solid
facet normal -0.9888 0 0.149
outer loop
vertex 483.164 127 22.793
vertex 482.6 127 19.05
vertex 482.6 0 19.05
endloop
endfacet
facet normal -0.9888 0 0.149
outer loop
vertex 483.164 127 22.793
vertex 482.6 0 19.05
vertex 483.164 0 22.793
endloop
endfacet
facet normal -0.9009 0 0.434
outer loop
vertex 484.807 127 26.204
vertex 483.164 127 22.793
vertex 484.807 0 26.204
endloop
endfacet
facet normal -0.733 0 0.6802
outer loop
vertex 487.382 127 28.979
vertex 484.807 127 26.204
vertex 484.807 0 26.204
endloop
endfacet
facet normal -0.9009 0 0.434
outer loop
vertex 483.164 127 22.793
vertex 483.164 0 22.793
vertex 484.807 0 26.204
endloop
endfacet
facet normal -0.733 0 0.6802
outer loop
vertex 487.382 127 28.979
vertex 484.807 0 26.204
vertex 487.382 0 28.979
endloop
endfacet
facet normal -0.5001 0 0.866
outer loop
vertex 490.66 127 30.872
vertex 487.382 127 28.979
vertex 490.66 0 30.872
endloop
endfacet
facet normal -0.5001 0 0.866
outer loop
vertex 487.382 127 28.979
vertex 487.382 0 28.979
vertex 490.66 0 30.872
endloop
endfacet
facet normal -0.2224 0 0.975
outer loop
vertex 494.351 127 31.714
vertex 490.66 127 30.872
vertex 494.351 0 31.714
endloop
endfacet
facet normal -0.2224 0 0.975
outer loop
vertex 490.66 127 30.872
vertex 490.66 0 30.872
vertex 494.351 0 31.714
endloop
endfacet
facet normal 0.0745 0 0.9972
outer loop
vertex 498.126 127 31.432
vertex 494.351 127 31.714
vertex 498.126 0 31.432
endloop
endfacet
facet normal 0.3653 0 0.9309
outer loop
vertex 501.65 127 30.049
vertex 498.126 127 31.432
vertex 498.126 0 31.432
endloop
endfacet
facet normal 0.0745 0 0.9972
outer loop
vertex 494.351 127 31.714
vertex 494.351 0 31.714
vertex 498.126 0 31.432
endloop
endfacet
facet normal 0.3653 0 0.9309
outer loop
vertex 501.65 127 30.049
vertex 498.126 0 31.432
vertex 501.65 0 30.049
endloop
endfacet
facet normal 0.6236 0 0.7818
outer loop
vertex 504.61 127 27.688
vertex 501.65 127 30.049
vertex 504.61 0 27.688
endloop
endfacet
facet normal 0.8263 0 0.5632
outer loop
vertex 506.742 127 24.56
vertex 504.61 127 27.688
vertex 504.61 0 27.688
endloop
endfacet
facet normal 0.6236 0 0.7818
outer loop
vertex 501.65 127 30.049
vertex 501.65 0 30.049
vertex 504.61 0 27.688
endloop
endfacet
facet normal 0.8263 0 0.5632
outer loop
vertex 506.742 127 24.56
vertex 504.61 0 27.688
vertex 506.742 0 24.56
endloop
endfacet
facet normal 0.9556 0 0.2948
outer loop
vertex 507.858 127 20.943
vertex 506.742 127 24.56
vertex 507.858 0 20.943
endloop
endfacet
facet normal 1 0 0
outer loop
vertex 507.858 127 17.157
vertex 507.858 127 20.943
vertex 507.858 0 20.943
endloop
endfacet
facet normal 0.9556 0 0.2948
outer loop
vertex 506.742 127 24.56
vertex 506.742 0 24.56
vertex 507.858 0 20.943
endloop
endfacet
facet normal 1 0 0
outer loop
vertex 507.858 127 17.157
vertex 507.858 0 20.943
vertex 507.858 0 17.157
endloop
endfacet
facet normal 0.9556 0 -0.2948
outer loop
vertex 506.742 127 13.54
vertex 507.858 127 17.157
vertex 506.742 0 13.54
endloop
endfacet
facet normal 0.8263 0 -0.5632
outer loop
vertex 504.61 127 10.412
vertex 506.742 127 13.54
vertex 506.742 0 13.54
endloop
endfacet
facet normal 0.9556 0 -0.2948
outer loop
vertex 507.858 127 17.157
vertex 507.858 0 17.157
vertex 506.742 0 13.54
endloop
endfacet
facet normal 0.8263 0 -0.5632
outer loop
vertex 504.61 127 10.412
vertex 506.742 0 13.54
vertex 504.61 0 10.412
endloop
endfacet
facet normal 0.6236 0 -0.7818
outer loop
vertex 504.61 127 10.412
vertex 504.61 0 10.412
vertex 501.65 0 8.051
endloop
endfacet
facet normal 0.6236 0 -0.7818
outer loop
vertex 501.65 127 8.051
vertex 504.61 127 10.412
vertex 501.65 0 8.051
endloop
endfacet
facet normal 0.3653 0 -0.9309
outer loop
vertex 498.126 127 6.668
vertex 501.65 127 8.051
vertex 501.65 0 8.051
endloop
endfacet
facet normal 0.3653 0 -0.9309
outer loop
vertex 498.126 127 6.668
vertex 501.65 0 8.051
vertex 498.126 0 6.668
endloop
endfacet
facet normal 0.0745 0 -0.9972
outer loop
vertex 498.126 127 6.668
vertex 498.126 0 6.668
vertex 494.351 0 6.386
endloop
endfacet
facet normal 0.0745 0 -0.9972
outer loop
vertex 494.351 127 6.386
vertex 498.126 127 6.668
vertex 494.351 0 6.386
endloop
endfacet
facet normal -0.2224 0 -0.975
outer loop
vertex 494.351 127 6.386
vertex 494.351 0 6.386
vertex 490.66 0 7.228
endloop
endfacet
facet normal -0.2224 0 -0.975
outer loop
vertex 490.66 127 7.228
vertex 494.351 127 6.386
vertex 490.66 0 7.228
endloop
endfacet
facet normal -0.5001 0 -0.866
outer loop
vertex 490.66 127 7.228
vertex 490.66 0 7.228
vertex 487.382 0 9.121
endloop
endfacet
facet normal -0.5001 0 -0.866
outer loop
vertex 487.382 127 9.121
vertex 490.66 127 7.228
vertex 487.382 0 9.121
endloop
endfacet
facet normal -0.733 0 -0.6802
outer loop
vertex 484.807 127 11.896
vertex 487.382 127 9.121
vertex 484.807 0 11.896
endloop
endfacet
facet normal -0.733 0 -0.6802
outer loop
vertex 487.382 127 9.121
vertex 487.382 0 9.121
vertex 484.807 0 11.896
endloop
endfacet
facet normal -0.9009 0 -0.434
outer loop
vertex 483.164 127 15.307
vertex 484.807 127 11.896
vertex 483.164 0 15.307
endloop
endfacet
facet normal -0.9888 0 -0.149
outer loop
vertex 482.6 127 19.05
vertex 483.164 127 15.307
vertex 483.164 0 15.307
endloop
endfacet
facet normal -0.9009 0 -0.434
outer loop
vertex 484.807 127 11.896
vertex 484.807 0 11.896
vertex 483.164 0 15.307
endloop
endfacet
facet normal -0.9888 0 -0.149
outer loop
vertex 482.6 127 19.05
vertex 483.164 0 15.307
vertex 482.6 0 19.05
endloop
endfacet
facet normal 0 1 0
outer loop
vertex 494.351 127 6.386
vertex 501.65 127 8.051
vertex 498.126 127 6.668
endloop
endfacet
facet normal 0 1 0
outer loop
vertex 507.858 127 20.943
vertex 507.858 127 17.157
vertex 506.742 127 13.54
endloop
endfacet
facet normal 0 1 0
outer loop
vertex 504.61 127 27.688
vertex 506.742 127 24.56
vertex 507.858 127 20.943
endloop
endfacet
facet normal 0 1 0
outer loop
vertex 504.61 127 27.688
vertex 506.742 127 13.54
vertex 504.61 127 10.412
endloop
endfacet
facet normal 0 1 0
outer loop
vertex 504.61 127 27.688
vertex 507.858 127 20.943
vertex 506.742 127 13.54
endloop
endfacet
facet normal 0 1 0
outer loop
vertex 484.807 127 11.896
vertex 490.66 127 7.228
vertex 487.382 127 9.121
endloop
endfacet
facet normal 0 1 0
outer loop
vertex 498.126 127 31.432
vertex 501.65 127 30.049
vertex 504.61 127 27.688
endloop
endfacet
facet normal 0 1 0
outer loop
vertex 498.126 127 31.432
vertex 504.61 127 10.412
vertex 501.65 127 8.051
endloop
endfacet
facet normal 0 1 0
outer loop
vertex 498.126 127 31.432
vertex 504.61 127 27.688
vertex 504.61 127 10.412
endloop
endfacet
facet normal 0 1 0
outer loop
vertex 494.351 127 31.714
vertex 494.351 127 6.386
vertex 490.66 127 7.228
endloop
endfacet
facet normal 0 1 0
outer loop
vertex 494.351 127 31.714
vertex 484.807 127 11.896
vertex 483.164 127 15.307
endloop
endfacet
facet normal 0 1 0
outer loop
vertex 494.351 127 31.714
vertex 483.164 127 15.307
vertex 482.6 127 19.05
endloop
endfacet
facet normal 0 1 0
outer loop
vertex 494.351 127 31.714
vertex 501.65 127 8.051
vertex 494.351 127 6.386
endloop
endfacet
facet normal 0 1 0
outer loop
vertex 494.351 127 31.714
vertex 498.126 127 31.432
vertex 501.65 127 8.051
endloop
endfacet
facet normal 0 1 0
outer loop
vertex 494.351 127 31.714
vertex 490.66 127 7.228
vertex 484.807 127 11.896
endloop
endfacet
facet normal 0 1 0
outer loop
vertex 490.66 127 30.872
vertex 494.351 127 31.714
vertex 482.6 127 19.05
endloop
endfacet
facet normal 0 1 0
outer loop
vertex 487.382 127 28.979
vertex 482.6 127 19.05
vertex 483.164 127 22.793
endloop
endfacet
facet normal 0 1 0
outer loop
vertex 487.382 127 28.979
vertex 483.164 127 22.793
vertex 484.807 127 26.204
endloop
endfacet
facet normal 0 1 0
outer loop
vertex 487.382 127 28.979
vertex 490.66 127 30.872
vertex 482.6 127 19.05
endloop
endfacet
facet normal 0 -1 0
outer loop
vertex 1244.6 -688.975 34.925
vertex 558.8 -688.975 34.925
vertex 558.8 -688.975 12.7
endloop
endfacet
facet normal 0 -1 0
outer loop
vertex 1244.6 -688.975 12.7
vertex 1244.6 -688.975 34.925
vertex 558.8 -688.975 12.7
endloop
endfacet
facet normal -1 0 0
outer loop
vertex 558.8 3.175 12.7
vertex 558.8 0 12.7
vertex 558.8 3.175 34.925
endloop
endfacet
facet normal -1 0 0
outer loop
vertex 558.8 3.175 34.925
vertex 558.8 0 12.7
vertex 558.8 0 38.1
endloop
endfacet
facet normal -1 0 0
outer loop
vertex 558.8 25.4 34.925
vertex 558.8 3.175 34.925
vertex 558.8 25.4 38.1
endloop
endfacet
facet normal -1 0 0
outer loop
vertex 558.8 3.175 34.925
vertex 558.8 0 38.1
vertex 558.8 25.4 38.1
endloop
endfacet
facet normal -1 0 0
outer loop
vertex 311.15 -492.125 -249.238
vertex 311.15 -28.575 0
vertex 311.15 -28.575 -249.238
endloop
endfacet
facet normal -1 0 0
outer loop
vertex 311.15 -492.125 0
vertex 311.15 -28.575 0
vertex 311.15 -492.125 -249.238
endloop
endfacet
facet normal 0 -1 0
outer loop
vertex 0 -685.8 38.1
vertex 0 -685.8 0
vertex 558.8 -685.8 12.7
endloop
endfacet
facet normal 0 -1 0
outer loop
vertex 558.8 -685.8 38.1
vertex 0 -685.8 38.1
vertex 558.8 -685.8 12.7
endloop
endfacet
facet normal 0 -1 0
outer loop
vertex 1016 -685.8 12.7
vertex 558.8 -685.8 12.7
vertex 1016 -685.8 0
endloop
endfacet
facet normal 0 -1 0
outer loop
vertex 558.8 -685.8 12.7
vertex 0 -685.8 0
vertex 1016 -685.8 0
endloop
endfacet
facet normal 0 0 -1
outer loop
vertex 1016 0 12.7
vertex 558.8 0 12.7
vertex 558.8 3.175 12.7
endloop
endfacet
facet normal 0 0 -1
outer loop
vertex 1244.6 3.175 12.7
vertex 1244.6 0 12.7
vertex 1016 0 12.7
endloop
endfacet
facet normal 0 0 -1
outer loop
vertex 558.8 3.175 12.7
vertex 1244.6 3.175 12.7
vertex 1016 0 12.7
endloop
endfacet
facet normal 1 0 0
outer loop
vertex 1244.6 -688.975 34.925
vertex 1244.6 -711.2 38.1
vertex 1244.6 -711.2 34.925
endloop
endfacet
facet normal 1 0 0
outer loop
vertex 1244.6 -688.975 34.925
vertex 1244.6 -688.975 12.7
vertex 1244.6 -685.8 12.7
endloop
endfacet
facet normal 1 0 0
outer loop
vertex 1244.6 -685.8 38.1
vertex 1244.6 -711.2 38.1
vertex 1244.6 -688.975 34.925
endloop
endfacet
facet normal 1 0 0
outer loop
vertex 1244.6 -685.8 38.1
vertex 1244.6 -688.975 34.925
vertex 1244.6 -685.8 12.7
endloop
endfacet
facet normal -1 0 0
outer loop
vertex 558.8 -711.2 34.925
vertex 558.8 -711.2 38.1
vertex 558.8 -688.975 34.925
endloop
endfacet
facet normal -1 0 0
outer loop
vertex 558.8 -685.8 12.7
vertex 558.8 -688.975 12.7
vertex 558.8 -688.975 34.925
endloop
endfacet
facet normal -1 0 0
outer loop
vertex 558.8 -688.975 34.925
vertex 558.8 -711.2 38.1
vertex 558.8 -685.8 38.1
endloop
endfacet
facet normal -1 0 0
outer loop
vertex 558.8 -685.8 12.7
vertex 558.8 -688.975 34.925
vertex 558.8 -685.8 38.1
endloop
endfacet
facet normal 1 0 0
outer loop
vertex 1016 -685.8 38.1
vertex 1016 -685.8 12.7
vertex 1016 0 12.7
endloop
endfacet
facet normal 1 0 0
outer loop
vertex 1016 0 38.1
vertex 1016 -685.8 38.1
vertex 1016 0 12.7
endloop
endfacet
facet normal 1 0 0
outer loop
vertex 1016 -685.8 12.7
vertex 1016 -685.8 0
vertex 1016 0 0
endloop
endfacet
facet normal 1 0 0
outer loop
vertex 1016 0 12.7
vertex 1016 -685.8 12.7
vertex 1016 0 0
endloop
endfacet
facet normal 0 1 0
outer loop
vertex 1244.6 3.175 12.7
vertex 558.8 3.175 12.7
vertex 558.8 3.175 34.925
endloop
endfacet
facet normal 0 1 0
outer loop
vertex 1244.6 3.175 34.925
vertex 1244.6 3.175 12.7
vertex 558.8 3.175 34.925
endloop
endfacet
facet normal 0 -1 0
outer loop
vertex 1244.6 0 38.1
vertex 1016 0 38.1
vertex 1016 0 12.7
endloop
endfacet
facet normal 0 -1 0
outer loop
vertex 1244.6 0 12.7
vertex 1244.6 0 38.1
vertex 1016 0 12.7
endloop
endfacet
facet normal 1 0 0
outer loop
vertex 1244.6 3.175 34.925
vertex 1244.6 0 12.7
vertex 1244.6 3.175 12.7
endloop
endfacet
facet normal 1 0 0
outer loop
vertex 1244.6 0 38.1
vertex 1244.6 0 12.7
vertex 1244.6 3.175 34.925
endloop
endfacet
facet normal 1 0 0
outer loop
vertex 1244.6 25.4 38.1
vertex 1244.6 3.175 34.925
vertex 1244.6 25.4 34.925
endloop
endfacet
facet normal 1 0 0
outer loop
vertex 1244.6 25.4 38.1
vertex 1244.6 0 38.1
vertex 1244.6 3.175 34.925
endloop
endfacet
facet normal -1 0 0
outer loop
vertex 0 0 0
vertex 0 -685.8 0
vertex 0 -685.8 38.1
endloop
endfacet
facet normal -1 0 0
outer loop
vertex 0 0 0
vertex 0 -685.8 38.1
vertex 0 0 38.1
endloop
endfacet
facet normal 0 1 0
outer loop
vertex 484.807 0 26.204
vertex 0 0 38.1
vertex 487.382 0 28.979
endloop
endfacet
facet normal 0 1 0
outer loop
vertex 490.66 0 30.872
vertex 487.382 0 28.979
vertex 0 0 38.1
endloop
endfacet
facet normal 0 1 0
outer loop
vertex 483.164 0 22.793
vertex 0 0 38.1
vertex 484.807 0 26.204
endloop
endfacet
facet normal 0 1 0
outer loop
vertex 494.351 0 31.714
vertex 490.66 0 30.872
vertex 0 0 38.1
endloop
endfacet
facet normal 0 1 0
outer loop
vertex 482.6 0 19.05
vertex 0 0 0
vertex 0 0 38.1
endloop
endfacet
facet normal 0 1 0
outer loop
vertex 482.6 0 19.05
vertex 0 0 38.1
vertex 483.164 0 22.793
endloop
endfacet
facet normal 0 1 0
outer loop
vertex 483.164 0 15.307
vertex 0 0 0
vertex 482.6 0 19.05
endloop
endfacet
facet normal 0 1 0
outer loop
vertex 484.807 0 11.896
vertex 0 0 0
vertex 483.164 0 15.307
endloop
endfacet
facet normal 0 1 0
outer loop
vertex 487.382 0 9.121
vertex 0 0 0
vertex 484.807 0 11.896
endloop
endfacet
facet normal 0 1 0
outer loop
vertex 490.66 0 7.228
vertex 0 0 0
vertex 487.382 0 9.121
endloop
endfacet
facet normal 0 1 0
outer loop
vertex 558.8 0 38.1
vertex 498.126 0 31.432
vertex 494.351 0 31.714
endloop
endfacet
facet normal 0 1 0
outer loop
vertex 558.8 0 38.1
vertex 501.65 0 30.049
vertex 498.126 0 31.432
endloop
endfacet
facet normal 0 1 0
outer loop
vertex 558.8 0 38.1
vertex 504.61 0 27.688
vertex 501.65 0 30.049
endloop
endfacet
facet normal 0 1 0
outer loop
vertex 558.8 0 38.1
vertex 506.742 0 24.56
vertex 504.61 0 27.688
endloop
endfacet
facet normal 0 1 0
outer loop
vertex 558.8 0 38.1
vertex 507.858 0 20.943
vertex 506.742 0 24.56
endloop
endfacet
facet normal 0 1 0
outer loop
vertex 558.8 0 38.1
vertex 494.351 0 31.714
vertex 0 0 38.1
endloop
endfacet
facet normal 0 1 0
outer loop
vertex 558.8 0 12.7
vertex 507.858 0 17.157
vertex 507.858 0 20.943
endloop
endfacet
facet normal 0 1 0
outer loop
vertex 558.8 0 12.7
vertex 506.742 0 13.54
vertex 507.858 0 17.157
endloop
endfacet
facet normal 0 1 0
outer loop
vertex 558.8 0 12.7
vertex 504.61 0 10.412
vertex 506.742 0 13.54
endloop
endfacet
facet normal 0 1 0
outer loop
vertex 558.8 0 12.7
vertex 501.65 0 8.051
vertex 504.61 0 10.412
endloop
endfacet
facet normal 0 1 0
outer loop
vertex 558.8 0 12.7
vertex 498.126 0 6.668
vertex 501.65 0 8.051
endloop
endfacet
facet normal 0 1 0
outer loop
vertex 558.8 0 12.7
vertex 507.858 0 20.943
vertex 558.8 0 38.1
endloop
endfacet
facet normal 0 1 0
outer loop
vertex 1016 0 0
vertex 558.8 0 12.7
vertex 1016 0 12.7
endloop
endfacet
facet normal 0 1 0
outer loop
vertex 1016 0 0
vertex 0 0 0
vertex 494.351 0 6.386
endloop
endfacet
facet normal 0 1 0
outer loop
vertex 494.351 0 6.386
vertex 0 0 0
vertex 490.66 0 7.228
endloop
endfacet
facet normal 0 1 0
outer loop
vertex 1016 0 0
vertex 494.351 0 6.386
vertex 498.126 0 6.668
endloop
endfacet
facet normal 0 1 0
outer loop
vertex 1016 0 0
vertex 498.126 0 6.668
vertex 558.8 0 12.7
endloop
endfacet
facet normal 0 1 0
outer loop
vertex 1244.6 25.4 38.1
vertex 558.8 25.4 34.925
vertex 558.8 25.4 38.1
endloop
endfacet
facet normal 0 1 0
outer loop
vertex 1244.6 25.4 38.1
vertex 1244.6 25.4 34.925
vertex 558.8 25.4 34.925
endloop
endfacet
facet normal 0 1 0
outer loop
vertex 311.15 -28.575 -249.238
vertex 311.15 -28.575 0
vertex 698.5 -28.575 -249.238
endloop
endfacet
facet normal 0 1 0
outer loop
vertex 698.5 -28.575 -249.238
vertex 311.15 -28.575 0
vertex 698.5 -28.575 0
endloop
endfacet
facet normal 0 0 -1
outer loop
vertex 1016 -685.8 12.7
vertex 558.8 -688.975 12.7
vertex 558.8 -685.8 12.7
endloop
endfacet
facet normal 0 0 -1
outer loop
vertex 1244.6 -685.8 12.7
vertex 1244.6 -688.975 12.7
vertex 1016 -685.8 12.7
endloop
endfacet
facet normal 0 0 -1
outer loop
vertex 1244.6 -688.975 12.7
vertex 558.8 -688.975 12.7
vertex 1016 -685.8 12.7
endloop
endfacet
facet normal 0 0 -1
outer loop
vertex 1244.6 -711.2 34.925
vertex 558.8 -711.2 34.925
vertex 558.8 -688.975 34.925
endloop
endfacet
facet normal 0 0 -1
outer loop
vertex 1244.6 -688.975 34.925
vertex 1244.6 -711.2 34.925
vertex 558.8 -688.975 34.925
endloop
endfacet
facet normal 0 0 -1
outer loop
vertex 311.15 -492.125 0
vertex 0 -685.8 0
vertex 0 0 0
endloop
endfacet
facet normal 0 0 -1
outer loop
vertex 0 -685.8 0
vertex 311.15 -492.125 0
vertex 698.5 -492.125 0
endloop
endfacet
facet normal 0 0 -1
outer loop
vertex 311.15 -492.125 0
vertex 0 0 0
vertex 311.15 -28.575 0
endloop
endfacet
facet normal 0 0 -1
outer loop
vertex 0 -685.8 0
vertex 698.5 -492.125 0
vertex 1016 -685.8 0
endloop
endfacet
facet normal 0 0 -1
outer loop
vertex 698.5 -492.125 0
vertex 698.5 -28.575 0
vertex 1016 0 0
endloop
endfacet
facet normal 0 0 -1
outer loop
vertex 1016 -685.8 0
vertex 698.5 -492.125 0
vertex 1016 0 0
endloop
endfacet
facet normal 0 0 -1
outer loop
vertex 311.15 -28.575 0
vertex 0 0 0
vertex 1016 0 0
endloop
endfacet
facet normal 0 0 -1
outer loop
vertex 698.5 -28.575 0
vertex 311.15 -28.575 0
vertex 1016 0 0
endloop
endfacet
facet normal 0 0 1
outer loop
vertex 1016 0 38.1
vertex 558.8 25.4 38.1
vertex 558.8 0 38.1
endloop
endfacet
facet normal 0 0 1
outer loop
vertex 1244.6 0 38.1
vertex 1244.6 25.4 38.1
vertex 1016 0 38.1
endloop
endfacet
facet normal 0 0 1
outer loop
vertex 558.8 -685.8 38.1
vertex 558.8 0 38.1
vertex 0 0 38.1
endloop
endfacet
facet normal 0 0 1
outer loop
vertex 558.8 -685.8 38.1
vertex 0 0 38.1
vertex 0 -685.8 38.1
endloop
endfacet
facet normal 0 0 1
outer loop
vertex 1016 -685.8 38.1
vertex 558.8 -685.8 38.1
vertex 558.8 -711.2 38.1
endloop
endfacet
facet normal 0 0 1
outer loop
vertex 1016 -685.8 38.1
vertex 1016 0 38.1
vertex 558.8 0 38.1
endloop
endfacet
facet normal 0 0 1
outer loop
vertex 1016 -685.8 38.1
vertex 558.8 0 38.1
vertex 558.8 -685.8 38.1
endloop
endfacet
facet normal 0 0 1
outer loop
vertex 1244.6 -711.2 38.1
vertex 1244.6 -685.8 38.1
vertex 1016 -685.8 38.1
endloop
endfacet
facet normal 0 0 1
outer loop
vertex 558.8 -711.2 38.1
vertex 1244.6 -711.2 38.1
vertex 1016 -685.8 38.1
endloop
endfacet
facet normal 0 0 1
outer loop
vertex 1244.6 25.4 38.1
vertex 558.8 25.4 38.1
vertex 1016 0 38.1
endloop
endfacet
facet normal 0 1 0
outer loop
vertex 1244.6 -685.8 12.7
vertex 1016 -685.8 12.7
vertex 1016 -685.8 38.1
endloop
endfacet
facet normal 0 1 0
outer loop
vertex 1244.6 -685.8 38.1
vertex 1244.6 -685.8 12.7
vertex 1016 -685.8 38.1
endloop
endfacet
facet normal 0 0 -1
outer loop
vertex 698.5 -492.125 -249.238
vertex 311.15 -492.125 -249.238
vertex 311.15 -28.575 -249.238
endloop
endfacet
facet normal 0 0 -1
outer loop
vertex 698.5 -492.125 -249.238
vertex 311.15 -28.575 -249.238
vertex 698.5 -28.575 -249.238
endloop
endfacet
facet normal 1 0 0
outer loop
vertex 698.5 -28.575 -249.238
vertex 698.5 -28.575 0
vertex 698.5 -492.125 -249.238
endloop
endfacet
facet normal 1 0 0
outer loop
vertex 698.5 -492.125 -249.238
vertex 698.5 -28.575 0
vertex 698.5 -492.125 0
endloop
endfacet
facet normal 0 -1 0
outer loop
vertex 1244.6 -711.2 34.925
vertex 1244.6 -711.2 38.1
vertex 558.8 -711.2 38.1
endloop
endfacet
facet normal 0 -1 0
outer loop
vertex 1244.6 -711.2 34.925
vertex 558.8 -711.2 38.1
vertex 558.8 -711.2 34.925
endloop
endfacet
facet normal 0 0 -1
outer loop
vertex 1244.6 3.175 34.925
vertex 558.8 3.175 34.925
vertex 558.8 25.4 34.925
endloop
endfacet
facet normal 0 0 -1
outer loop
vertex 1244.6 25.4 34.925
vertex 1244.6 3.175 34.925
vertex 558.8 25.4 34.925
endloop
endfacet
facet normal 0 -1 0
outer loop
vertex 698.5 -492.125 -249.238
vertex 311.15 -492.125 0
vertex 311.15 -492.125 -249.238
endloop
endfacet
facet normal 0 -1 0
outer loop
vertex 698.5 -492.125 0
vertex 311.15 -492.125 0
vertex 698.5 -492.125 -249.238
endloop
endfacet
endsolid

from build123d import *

# Parameters (mm, degrees)
F0_W          = 1016
F0_H          = 685.8
F1_DEPTH      = 38.1
F2_W          = 387.35
F2_H          = 463.55
F3_DEPTH      = 249.2375
F4_R          = 12.7
F5_DEPTH      = 127
F7_DEPTH      = 228.6
F7_DEPTH_BACK = 457.2


with BuildPart() as f1:
    # F0 (on Top) → F1 (new body)
    with BuildSketch(Plane.XY):
        with Locations((508, -342.9)):
            Rectangle(F0_W, F0_H)
    extrude(amount=F1_DEPTH)

    # F2 (on face) → F3 (join)
    with BuildSketch(Plane(origin=(0, 0, 0), x_dir=(1, 0, 0), z_dir=(0, 0, -1))):
        with Locations((504.825, 260.35)):
            Rectangle(F2_W, F2_H)
    extrude(amount=F3_DEPTH)

    # F4 (on face) → F5 (join)
    with BuildSketch(Plane(origin=(0, 0, 0), x_dir=(-1, 0, 0), z_dir=(0, 1, 0))):
        with Locations((-495.3, 19.05)):
            Circle(F4_R)
    extrude(amount=F5_DEPTH)

    # F6 (on face) → F7 (join, two sides)
    with BuildSketch(Plane.YZ.offset(1016)) as f7_sk:
        Polygon((-685.8, 12.7), (-685.8, 38.1), (-711.2, 38.1), (-711.2, 34.925), (-688.975, 34.925), (-688.975, 12.7), align=None)
        Polygon((25.4, 38.1), (0, 38.1), (0, 12.7), (3.175, 12.7), (3.175, 34.925), (25.4, 34.925), align=None)
    extrude(amount=F7_DEPTH)
    extrude(f7_sk.sketch, amount=-F7_DEPTH_BACK)


solid = f1.part
